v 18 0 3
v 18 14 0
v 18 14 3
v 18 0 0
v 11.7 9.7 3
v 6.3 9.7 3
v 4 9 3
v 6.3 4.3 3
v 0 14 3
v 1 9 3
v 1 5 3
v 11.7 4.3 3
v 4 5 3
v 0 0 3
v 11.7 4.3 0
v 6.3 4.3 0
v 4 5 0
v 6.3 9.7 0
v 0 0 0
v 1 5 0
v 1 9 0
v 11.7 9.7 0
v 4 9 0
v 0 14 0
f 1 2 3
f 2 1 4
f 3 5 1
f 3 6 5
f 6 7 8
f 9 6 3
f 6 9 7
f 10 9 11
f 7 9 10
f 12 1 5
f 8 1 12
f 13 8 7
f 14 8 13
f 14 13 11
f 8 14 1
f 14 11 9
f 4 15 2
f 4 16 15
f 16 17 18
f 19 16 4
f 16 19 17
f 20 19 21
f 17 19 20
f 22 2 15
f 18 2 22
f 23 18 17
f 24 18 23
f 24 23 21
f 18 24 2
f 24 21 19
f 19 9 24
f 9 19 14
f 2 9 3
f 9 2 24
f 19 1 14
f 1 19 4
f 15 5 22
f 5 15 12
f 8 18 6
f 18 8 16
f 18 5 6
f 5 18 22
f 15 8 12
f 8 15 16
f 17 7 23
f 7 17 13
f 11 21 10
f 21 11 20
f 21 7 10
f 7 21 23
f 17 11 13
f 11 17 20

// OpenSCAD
// TEMPLATE ONLY. Measure and edit before printing. Millimetres.
difference(){union(){
translate([0, 0, 0]) cube([18, 14, 3]);
}
translate([6.3, 4.3, -1]) cube([5.3999999999999995, 5.3999999999999995, 5]);
translate([1, 5, -1]) cube([3, 4, 5]);
}
